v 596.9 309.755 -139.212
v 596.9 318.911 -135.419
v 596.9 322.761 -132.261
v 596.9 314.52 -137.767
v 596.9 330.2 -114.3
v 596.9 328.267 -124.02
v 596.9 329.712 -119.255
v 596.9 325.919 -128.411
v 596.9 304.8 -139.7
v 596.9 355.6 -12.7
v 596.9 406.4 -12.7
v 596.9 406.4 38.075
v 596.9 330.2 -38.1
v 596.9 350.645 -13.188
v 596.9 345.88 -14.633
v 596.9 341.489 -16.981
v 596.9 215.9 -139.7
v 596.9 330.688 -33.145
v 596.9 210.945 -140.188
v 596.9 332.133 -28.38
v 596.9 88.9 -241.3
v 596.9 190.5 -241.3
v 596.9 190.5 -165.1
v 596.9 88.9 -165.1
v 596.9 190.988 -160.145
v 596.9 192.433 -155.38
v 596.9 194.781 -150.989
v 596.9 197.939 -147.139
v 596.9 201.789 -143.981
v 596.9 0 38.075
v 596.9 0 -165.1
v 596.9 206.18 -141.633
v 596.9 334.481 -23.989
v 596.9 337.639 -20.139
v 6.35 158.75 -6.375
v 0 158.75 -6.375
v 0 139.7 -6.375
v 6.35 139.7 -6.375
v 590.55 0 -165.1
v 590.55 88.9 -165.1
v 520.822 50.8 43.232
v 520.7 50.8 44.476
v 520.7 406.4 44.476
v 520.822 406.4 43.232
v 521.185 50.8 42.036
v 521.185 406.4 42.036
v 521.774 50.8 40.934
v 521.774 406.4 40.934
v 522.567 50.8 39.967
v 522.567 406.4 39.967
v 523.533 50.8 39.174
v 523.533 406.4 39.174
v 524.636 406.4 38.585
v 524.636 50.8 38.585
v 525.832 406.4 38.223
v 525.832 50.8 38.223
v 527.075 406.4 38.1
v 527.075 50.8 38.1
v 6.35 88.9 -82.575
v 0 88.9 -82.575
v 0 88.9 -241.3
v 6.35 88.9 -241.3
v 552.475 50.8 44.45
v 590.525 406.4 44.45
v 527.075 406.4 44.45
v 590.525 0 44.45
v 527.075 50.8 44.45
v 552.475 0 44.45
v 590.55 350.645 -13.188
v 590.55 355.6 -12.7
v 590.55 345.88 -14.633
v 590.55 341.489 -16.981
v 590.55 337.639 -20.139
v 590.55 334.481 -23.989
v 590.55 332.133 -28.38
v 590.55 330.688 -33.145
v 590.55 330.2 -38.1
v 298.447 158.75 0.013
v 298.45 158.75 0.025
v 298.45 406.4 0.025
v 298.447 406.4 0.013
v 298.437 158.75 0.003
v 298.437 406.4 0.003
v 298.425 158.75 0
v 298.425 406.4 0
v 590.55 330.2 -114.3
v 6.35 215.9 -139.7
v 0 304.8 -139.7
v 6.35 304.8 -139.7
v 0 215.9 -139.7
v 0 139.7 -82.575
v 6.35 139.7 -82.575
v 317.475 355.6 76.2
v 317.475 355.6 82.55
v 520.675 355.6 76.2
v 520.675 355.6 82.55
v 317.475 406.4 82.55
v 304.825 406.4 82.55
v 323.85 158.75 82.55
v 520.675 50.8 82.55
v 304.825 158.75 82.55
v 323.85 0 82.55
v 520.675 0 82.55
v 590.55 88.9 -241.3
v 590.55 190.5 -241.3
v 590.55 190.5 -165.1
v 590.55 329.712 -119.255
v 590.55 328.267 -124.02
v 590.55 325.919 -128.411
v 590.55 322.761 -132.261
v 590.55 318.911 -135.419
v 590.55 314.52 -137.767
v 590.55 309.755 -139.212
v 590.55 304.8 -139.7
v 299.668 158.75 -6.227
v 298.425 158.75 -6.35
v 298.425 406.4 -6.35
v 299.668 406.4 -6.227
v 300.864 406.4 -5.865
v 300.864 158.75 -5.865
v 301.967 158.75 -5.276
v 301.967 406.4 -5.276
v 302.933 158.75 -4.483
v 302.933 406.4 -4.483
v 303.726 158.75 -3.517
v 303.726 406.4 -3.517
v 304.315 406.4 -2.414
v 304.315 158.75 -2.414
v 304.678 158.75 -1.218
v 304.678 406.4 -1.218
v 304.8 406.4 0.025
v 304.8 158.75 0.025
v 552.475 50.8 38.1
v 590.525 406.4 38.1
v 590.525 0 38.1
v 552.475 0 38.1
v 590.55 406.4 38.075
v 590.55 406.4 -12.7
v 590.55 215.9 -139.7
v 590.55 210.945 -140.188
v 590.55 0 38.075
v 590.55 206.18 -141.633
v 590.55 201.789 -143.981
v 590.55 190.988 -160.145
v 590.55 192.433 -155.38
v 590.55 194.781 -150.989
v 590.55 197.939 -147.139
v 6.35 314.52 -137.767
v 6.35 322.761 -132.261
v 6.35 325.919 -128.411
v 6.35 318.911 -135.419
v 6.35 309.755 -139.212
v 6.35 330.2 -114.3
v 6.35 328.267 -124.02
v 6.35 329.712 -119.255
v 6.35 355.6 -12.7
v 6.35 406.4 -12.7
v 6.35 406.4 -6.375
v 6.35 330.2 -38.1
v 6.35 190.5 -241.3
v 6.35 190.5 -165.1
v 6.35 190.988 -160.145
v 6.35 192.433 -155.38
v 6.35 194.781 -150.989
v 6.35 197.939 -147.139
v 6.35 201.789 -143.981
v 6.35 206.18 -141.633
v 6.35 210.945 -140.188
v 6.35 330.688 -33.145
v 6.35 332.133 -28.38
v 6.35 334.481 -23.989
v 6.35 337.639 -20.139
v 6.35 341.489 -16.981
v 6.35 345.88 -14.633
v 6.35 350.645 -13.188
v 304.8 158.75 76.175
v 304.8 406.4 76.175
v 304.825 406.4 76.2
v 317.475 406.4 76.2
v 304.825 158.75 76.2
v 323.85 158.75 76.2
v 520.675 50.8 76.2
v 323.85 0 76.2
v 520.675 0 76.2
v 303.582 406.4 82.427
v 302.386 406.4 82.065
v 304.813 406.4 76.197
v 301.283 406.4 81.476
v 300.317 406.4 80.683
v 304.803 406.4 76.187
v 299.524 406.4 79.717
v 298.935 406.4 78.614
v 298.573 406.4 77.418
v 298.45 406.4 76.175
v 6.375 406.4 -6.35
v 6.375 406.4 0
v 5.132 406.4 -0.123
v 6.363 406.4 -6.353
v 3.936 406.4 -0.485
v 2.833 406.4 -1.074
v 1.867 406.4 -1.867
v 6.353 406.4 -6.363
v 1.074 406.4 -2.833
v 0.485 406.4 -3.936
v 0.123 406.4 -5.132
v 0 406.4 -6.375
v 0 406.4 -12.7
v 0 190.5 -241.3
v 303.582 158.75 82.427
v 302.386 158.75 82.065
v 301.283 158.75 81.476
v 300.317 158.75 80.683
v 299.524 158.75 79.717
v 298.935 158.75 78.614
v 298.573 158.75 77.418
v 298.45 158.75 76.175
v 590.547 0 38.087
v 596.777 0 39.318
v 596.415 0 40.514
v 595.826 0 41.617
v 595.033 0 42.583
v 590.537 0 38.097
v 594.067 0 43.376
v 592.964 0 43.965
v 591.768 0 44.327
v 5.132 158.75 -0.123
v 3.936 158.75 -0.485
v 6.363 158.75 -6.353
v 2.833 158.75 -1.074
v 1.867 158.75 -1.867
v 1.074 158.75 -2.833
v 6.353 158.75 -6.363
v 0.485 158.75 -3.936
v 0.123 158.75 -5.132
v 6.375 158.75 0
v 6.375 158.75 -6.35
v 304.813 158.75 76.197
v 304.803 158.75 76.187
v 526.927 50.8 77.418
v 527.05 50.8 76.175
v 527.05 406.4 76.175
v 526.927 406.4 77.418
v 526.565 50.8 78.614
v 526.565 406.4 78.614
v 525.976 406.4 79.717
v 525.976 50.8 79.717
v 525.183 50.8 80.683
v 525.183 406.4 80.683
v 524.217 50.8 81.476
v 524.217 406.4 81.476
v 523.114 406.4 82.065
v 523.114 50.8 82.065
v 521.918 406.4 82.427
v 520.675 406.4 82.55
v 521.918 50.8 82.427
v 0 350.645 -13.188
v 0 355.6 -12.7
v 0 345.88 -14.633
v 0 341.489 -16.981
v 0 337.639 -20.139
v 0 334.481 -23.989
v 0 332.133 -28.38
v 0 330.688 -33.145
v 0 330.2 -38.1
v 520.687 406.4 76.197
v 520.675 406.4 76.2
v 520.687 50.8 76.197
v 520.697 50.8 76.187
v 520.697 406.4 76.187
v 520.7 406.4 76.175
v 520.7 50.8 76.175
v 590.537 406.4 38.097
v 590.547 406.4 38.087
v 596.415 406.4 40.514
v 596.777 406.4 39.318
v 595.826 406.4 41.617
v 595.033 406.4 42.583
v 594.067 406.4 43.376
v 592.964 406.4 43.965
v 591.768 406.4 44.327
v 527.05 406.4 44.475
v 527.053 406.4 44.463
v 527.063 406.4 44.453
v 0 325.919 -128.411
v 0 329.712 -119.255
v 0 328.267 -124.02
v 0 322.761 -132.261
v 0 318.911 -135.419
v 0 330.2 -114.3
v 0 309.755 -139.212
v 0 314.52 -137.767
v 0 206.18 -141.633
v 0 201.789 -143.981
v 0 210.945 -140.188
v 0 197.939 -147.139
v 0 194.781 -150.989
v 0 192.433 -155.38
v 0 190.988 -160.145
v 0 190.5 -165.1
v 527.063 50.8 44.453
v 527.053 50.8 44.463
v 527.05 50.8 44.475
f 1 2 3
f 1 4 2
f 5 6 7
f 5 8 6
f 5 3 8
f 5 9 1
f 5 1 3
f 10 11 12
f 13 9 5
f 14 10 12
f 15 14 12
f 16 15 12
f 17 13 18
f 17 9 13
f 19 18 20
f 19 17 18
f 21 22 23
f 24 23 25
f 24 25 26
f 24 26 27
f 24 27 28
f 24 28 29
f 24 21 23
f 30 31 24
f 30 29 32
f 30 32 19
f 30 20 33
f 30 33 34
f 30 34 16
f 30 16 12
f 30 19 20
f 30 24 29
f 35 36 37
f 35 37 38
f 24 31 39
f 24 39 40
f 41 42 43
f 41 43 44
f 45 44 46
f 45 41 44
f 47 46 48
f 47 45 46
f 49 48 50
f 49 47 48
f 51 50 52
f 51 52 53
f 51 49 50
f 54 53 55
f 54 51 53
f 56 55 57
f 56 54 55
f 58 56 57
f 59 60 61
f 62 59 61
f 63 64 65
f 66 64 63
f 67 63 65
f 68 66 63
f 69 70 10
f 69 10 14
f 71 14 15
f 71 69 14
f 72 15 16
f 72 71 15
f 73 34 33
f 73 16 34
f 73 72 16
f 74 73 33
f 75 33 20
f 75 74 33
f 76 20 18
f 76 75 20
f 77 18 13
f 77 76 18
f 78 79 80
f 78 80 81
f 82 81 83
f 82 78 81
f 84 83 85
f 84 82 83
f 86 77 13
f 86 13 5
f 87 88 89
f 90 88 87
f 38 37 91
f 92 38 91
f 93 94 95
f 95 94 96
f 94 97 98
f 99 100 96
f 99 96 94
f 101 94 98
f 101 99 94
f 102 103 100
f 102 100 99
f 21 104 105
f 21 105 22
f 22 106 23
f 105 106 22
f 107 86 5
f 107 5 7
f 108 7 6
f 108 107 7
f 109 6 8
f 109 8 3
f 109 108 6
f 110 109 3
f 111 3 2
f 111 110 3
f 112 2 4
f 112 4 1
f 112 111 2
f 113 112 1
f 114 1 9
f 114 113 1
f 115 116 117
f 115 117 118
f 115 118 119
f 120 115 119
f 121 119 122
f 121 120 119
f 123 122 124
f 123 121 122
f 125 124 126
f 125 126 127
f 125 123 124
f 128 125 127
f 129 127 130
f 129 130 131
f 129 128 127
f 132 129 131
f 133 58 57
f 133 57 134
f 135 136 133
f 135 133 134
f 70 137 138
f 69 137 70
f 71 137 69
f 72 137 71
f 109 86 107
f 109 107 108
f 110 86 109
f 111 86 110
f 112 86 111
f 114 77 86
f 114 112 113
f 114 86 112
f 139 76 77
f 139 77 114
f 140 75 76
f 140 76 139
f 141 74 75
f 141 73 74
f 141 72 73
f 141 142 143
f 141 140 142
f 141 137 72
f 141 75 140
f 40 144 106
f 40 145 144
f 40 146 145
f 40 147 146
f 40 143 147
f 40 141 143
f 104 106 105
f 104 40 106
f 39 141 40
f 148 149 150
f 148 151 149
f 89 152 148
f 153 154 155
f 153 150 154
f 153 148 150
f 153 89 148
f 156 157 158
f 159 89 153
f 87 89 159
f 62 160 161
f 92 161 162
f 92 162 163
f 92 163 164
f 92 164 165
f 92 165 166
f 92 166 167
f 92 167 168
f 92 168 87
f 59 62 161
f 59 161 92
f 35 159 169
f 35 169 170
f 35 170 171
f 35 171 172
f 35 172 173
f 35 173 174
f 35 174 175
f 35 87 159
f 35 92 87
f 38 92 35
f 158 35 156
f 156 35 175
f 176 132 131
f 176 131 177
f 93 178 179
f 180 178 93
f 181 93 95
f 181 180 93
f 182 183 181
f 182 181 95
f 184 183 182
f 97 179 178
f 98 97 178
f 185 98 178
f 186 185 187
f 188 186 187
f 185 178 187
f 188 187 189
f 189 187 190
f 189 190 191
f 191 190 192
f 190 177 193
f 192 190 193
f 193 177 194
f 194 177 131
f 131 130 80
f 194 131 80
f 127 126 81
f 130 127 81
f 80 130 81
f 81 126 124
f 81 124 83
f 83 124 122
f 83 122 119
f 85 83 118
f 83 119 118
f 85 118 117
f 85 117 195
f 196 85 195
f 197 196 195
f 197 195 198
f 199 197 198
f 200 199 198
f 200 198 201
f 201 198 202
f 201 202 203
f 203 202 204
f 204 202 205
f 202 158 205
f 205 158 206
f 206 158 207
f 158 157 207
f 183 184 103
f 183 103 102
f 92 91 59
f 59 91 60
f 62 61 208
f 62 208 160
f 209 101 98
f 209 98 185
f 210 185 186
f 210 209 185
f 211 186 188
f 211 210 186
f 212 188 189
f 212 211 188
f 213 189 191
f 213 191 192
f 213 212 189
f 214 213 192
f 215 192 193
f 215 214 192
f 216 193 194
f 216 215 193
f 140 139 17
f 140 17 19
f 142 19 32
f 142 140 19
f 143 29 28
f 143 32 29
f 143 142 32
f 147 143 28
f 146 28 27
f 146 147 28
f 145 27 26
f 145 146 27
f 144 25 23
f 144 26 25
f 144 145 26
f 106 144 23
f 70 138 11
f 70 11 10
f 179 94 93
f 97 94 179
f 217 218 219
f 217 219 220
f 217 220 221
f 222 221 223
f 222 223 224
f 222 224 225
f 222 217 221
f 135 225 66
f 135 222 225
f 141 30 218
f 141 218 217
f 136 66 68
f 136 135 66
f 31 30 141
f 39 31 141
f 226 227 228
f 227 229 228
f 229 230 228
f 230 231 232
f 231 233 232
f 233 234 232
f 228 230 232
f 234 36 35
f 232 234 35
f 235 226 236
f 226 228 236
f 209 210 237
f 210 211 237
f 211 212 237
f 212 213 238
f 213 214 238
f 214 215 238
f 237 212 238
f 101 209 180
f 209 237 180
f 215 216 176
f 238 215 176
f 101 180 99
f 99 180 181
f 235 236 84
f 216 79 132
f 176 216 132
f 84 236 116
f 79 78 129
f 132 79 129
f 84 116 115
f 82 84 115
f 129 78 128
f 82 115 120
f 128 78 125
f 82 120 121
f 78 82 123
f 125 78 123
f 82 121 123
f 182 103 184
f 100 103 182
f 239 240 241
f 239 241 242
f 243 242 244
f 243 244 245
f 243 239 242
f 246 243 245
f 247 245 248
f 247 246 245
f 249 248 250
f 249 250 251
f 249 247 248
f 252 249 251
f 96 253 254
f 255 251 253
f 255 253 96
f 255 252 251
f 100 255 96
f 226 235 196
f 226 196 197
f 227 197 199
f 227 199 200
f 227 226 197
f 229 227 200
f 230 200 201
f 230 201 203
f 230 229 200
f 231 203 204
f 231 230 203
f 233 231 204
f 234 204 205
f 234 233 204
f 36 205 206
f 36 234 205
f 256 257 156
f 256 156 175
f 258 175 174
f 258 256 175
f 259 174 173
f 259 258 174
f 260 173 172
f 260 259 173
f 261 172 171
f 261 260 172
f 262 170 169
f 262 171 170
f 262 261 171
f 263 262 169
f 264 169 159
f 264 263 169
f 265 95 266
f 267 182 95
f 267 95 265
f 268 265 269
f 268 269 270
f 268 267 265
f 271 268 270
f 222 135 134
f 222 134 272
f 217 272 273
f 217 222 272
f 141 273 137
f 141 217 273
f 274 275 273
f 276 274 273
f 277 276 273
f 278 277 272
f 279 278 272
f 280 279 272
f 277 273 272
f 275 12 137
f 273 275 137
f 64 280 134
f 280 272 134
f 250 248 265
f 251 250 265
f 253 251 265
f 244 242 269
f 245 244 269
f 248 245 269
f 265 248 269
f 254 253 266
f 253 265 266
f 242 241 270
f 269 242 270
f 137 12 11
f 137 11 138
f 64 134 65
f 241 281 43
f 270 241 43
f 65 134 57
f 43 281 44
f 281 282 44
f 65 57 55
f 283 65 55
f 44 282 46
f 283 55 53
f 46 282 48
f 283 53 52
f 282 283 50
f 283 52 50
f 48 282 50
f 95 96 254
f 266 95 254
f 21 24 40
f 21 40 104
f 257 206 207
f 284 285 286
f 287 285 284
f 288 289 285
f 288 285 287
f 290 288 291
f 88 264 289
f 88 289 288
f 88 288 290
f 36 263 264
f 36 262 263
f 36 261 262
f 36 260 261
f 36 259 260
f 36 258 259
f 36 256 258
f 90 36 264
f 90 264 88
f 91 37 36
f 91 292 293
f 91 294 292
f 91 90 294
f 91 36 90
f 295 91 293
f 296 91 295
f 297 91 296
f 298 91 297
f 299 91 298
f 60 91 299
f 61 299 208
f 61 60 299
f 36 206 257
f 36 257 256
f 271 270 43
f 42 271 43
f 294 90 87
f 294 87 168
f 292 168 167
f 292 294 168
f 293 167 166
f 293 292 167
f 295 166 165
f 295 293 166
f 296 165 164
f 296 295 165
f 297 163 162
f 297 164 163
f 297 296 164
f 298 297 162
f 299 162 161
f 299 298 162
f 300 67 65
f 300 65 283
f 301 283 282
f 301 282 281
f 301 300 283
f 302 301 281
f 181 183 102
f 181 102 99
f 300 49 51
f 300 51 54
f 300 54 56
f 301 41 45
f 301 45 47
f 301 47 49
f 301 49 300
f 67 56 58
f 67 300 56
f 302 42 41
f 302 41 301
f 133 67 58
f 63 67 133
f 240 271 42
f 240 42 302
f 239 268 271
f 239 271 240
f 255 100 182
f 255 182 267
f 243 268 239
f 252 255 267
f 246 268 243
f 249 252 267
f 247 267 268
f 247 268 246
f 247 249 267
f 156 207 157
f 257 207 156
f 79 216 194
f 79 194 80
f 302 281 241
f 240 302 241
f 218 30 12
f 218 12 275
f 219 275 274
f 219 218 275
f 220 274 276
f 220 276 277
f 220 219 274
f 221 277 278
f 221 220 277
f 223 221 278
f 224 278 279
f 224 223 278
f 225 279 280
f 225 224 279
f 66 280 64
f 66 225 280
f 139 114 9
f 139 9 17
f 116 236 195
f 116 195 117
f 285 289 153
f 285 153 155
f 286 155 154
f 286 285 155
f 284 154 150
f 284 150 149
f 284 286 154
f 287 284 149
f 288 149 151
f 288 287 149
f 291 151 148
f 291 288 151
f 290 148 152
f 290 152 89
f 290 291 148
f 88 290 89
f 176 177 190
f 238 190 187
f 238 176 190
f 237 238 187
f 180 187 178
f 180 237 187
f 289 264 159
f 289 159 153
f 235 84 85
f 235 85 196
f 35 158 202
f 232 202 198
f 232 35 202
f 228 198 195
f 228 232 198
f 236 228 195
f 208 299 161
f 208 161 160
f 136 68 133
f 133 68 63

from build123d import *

# Parameters (mm, degrees)
BASE_FLANGE1_DEPTH      = 406.4
CUT_EXTRUDE1_START      = -88.9254
CUT_EXTRUDE1_OUTLINE_W  = 324.85
CUT_EXTRUDE1_OUTLINE_H  = 158.75
CUT_EXTRUDE1_DEPTH      = 88.9254
CUT_EXTRUDE2_REACH      = 763.365
CUT_EXTRUDE3_REACH      = 763.365
SKETCH5_W               = 76.2
SKETCH5_H               = 88.9
CUT_EXTRUDE4_REACH      = 778.597
SKETCH6_W               = 25.4
SKETCH6_H               = 50.8
CUT_EXTRUDE5_REACH      = 793.41
SKETCH8_W               = 31.8008
SKETCH8_H               = 50.8
SKETCH9_W               = 203.2
SKETCH9_H               = 50.8
CUT_EXTRUDE6_DEPTH      = 792.409750066
CUT_EXTRUDE8_DEPTH      = 757.396689906
CUT_EXTRUDE8_DEPTH_BACK = 757.396689906


# Read off the part's stored shape, not the designer's step: Cut-Extrude1
# Sheet-metal steps are written as plain solids
with BuildPart() as part:
    # Sketch2 → Base-Flange1 (new body)
    with BuildSketch(Plane(origin=(0, 0, 0), x_dir=(1, 0, 0), z_dir=(0, 1, 0))):
        with BuildLine():
            Line((596.9, 241.3), (596.9, -38.0746))
            ThreePointArc((596.9, -38.0746), (595.032688573, -42.582688573), (590.5246, -44.45))
            Line((590.5246, -44.45), (527.0754, -44.45))
            ThreePointArc((527.0754, -44.45), (527.057439485, -44.457439486), (527.05, -44.4754))
            Line((527.05, -44.4754), (527.05, -76.1746))
            ThreePointArc((527.05, -76.1746), (525.182688573, -80.682688573), (520.6746, -82.55))
            Line((520.6746, -82.55), (304.8254, -82.55))
            ThreePointArc((304.8254, -82.55), (300.317311427, -80.682688573), (298.45, -76.1746))
            Line((298.45, -76.1746), (298.45, -0.0254))
            ThreePointArc((298.45, -0.0254), (298.442560512, -0.007439487), (298.4246, 0))
            Line((298.4246, 0), (6.3754, 0))
            ThreePointArc((6.3754, 0), (1.867311427, 1.867311427), (0, 6.3754))
            Line((0, 6.3754), (0, 241.3))
            Line((0, 241.3), (6.35, 241.3))
            Line((6.35, 241.3), (6.35, 6.3754))
            ThreePointArc((6.35, 6.3754), (6.357439488, 6.357439488), (6.3754, 6.35))
            Line((6.3754, 6.35), (298.424685325, 6.35))
            ThreePointArc((298.424685325, 6.35), (302.932718863, 4.482658283), (304.8, -0.025400347))
            Line((304.8, -0.025400347), (304.8, -76.1746))
            ThreePointArc((304.8, -76.1746), (304.807439488, -76.192560512), (304.8254, -76.2))
            Line((304.8254, -76.2), (520.6746, -76.2))
            ThreePointArc((520.6746, -76.2), (520.692560512, -76.192560512), (520.7, -76.1746))
            Line((520.7, -76.1746), (520.7, -44.47559657))
            ThreePointArc((520.7, -44.47559657), (522.567241925, -39.967380926), (527.075399994, -38.1))
            Line((527.075399994, -38.1), (590.5246, -38.1))
            ThreePointArc((590.5246, -38.1), (590.542560512, -38.092560512), (590.55, -38.0746))
            Line((590.55, -38.0746), (590.55, 241.3))
            Line((590.55, 241.3), (596.9, 241.3))
        make_face()
    extrude(amount=BASE_FLANGE1_DEPTH)

    # Cut-Extrude1 outline → Cut-Extrude1 (cut)
    with BuildSketch(Plane.XY.offset(82.55).offset(CUT_EXTRUDE1_START)):
        with Locations((161.425, 79.375)):
            Rectangle(CUT_EXTRUDE1_OUTLINE_W, CUT_EXTRUDE1_OUTLINE_H)
    extrude(amount=CUT_EXTRUDE1_DEPTH, mode=Mode.SUBTRACT)

    # Sketch4 → Cut-Extrude2 (cut, up to next)
    with BuildSketch(Plane.ZY, mode=Mode.PRIVATE) as cut_extrude2_sk1:
        Polygon((-241.3, 0), (-6.3754, 0), (-6.3754, 139.7), (-82.5754, 139.7), (-82.5754, 88.9), (-241.3, 88.9), align=None)
    cut_extrude2_tool1 = extrude(cut_extrude2_sk1.sketch, amount=-CUT_EXTRUDE2_REACH, mode=Mode.PRIVATE) & part.part
    add(cut_extrude2_tool1.solids().sort_by_distance((0, 55.372169, -111.42813))[0], mode=Mode.SUBTRACT)

    # Sketch5 → Cut-Extrude3 (cut, up to next)
    with BuildSketch(Plane(origin=(596.9, 0, 0), x_dir=(0, 0, -1), z_dir=(1, 0, 0)), mode=Mode.PRIVATE) as cut_extrude3_sk1:
        with Locations((203.2, 44.45)):
            Rectangle(SKETCH5_W, SKETCH5_H)
    cut_extrude3_tool1 = extrude(cut_extrude3_sk1.sketch, amount=-CUT_EXTRUDE3_REACH, mode=Mode.PRIVATE) & part.part
    add(cut_extrude3_tool1.solids().sort_by_distance((596.9, 44.45, -203.2))[0], mode=Mode.SUBTRACT)

    # Sketch6 → Cut-Extrude4 (cut, up to next)
    with BuildSketch(Plane.XY.offset(44.45), mode=Mode.PRIVATE) as cut_extrude4_sk1:
        with Locations((539.7754, 25.4)):
            Rectangle(SKETCH6_W, SKETCH6_H)
    cut_extrude4_tool1 = extrude(cut_extrude4_sk1.sketch, amount=-CUT_EXTRUDE4_REACH, mode=Mode.PRIVATE) & part.part
    add(cut_extrude4_tool1.solids().sort_by_distance((539.7754, 25.4, 44.45))[0], mode=Mode.SUBTRACT)

    # Sketch8 → Cut-Extrude5 (cut, up to next)
    with BuildSketch(Plane.XY.offset(82.55), mode=Mode.PRIVATE) as cut_extrude5_sk1:
        with Locations((536.575, 25.4)):
            Rectangle(SKETCH8_W, SKETCH8_H)
    cut_extrude5_tool1 = extrude(cut_extrude5_sk1.sketch, amount=-CUT_EXTRUDE5_REACH, mode=Mode.PRIVATE) & part.part
    add(cut_extrude5_tool1.solids().sort_by_distance((536.575, 25.4, 82.55))[0], mode=Mode.SUBTRACT)

    # Sketch9 → Cut-Extrude6 (cut, through all)
    with BuildSketch(Plane.XY.offset(82.55)):
        with Locations((419.0746, 381)):
            Rectangle(SKETCH9_W, SKETCH9_H)
    extrude(amount=-CUT_EXTRUDE6_DEPTH, mode=Mode.SUBTRACT)

    # Sketch11 → Cut-Extrude8 (cut, two sides: drawn at the far end of the back side and taken through both)
    with BuildSketch(Plane(origin=(6.35, 0, 0), x_dir=(0, 0, -1), z_dir=(1, 0, 0)).offset(-CUT_EXTRUDE8_DEPTH_BACK)):
        with BuildLine():
            Line((12.7, 406.4), (12.7, 355.6))
            ThreePointArc((12.7, 355.6), (20.139487758, 337.639487758), (38.1, 330.2))
            Line((38.1, 330.2), (114.3, 330.2))
            ThreePointArc((114.3, 330.2), (132.260512242, 322.760512242), (139.7, 304.8))
            Line((139.7, 304.8), (139.7, 215.9))
            ThreePointArc((139.7, 215.9), (147.139487758, 197.939487758), (165.1, 190.5))
            Line((165.1, 190.5), (241.3, 190.5))
            Line((241.3, 190.5), (241.3, 406.4))
            Line((241.3, 406.4), (12.7, 406.4))
        make_face()
    extrude(amount=CUT_EXTRUDE8_DEPTH + CUT_EXTRUDE8_DEPTH_BACK, mode=Mode.SUBTRACT)


solid = part.part
